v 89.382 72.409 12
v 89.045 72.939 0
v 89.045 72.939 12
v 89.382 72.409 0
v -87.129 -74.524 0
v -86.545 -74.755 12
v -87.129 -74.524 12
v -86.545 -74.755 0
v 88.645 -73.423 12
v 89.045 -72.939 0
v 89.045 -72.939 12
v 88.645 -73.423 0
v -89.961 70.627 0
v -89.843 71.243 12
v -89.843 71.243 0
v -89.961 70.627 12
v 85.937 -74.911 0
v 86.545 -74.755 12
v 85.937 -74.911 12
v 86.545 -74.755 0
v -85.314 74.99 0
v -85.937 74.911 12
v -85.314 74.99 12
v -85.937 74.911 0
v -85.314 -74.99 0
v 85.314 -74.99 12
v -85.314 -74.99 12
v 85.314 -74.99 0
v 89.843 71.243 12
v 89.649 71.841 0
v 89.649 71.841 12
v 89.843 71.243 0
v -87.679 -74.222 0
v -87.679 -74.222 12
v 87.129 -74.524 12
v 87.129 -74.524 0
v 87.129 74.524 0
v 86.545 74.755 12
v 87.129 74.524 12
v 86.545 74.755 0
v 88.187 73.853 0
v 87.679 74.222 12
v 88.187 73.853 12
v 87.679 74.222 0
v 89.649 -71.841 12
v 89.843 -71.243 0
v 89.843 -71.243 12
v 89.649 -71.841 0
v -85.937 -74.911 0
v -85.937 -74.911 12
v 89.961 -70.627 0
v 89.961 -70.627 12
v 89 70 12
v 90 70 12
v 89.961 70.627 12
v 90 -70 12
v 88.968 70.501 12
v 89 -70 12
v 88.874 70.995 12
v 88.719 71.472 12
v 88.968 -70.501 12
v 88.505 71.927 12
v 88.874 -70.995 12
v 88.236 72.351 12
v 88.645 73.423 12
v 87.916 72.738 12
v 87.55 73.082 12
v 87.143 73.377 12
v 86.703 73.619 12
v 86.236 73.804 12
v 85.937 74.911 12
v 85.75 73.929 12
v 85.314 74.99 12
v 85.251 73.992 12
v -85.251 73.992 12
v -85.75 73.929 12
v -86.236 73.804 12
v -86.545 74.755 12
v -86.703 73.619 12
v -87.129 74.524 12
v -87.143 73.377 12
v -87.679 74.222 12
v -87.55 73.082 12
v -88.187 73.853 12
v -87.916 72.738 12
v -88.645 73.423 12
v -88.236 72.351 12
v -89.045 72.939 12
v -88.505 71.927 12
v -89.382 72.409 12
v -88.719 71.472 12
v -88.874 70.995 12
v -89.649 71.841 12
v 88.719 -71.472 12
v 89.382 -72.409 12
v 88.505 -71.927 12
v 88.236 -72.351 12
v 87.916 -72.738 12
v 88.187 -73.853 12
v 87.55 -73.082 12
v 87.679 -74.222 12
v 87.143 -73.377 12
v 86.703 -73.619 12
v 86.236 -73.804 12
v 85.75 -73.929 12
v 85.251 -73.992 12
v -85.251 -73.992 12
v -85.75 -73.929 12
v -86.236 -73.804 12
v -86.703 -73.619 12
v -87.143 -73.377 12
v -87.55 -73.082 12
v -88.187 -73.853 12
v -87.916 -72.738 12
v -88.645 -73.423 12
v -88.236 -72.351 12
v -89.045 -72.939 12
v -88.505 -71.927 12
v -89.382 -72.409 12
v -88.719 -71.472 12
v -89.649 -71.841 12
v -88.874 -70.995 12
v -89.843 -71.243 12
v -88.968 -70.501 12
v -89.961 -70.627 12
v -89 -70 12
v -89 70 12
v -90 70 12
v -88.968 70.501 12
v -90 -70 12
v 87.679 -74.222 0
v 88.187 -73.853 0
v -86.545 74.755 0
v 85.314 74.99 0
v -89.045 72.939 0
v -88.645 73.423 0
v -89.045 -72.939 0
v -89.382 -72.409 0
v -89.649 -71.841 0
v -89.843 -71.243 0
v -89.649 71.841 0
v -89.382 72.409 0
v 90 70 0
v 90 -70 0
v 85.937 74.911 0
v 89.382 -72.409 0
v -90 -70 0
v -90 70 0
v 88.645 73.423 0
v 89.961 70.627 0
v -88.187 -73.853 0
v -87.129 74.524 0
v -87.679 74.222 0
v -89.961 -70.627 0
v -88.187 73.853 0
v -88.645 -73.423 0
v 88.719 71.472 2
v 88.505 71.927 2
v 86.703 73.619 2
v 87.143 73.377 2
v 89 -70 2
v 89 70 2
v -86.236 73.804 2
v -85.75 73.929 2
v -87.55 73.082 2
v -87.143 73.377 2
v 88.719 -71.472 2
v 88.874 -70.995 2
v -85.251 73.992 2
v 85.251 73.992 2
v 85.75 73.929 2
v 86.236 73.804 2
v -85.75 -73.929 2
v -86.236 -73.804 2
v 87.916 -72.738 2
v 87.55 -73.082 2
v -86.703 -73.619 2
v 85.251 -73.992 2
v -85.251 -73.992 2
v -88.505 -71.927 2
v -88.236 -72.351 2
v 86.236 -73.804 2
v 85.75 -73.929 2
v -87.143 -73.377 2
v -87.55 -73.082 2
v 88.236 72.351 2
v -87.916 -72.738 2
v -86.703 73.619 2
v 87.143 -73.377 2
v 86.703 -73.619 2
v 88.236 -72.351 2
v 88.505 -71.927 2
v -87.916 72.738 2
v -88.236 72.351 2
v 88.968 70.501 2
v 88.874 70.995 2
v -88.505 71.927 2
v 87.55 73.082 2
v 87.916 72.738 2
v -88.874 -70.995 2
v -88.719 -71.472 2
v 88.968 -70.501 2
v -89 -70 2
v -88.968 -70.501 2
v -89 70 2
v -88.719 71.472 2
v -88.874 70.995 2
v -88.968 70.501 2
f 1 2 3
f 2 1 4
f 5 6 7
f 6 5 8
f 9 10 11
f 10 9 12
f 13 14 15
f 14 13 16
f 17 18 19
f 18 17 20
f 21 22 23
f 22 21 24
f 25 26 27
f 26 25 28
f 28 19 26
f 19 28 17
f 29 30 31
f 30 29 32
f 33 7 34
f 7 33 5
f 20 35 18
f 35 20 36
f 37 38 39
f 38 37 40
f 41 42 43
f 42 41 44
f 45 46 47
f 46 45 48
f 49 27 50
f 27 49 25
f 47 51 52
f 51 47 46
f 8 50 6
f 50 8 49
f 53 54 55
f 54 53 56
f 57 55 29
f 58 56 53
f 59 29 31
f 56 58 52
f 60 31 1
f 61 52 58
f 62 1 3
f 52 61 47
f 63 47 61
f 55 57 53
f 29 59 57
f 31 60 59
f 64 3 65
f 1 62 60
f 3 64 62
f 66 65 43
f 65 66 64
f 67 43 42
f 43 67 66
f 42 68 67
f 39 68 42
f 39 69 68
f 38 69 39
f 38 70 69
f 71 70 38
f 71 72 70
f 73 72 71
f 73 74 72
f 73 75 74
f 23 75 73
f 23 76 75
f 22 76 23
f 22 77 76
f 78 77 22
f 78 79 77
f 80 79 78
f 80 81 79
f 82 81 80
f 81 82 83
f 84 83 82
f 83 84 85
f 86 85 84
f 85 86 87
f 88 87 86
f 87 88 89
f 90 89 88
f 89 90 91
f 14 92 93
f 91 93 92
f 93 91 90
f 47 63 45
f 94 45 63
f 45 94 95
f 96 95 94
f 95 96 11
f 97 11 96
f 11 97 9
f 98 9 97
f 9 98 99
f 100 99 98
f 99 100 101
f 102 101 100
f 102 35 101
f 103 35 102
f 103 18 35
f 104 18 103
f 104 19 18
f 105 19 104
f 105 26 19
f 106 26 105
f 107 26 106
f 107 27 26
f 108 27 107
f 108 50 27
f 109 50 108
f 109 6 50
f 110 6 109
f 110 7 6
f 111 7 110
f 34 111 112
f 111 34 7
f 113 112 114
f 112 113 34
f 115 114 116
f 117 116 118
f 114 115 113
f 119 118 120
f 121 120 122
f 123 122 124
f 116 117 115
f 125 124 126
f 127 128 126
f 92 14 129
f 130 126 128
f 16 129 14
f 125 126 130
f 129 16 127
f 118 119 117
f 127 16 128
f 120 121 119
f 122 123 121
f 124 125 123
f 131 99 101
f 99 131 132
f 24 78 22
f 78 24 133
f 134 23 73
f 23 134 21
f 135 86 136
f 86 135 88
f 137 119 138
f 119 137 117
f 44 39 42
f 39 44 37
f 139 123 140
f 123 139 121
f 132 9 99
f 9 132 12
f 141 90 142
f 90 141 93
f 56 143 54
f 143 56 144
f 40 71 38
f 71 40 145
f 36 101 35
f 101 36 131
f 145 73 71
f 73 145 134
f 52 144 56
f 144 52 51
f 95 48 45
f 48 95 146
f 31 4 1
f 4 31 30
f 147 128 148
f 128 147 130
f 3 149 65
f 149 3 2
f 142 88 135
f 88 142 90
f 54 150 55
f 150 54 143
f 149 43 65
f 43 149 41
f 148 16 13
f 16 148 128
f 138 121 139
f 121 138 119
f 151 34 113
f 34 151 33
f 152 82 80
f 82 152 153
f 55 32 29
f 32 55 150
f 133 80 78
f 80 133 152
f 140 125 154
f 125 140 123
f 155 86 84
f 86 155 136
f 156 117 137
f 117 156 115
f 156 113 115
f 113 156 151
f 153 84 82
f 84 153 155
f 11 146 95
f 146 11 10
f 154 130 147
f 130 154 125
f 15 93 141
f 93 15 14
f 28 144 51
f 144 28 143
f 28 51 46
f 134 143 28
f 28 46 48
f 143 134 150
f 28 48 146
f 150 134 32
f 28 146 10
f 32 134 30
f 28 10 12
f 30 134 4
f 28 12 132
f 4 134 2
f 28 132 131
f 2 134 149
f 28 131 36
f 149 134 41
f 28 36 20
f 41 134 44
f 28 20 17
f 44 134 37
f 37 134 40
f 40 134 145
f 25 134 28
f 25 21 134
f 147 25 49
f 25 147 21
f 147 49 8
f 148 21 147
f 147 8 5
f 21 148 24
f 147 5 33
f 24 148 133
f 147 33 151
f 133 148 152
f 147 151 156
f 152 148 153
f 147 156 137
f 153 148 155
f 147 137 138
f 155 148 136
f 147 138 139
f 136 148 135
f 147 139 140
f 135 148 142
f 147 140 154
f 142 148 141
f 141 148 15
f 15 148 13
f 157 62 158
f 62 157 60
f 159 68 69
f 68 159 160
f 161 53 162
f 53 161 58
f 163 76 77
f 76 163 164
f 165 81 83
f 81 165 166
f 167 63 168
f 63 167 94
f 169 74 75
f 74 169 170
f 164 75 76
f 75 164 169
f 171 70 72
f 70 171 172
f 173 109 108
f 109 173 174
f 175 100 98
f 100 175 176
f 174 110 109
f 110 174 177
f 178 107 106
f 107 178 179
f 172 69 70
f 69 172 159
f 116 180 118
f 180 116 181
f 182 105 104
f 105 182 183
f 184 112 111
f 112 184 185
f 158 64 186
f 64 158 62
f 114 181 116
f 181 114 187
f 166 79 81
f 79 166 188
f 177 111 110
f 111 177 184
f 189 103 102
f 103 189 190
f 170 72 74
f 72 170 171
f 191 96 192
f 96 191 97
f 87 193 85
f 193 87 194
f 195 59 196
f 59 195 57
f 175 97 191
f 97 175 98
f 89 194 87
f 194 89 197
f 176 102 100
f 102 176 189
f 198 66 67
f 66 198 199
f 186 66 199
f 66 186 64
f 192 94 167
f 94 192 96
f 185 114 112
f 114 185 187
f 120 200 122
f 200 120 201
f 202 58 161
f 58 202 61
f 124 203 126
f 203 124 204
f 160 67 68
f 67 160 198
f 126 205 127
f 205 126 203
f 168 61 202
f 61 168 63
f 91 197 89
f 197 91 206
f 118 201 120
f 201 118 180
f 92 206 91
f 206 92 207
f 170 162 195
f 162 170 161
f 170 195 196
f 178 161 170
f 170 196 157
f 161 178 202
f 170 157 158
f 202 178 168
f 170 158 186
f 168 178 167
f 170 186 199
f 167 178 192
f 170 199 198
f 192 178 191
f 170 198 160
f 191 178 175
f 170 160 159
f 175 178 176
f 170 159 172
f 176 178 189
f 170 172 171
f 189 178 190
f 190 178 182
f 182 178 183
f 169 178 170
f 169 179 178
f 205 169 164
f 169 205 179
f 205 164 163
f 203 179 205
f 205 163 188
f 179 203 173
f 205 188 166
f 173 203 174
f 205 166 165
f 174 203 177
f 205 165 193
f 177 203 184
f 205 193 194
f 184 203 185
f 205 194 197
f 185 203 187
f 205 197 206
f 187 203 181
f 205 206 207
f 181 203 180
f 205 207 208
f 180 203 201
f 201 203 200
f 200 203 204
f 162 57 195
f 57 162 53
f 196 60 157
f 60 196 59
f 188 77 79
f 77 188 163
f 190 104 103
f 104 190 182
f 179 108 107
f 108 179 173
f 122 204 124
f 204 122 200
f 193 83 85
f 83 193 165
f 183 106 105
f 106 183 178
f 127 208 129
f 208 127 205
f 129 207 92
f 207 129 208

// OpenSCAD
$fn = 50;


difference() {
	union() {
		hull() {
			translate(v = [-85.0000000000, 70.0000000000, 0]) {
				cylinder(h = 12, r = 5);
			}
			translate(v = [85.0000000000, 70.0000000000, 0]) {
				cylinder(h = 12, r = 5);
			}
			translate(v = [-85.0000000000, -70.0000000000, 0]) {
				cylinder(h = 12, r = 5);
			}
			translate(v = [85.0000000000, -70.0000000000, 0]) {
				cylinder(h = 12, r = 5);
			}
		}
	}
	union() {
		translate(v = [0, 0, 2]) {
			hull() {
				translate(v = [-85.0000000000, 70.0000000000, 0]) {
					cylinder(h = 10, r = 4);
				}
				translate(v = [85.0000000000, 70.0000000000, 0]) {
					cylinder(h = 10, r = 4);
				}
				translate(v = [-85.0000000000, -70.0000000000, 0]) {
					cylinder(h = 10, r = 4);
				}
				translate(v = [85.0000000000, -70.0000000000, 0]) {
					cylinder(h = 10, r = 4);
				}
			}
		}
	}
}
